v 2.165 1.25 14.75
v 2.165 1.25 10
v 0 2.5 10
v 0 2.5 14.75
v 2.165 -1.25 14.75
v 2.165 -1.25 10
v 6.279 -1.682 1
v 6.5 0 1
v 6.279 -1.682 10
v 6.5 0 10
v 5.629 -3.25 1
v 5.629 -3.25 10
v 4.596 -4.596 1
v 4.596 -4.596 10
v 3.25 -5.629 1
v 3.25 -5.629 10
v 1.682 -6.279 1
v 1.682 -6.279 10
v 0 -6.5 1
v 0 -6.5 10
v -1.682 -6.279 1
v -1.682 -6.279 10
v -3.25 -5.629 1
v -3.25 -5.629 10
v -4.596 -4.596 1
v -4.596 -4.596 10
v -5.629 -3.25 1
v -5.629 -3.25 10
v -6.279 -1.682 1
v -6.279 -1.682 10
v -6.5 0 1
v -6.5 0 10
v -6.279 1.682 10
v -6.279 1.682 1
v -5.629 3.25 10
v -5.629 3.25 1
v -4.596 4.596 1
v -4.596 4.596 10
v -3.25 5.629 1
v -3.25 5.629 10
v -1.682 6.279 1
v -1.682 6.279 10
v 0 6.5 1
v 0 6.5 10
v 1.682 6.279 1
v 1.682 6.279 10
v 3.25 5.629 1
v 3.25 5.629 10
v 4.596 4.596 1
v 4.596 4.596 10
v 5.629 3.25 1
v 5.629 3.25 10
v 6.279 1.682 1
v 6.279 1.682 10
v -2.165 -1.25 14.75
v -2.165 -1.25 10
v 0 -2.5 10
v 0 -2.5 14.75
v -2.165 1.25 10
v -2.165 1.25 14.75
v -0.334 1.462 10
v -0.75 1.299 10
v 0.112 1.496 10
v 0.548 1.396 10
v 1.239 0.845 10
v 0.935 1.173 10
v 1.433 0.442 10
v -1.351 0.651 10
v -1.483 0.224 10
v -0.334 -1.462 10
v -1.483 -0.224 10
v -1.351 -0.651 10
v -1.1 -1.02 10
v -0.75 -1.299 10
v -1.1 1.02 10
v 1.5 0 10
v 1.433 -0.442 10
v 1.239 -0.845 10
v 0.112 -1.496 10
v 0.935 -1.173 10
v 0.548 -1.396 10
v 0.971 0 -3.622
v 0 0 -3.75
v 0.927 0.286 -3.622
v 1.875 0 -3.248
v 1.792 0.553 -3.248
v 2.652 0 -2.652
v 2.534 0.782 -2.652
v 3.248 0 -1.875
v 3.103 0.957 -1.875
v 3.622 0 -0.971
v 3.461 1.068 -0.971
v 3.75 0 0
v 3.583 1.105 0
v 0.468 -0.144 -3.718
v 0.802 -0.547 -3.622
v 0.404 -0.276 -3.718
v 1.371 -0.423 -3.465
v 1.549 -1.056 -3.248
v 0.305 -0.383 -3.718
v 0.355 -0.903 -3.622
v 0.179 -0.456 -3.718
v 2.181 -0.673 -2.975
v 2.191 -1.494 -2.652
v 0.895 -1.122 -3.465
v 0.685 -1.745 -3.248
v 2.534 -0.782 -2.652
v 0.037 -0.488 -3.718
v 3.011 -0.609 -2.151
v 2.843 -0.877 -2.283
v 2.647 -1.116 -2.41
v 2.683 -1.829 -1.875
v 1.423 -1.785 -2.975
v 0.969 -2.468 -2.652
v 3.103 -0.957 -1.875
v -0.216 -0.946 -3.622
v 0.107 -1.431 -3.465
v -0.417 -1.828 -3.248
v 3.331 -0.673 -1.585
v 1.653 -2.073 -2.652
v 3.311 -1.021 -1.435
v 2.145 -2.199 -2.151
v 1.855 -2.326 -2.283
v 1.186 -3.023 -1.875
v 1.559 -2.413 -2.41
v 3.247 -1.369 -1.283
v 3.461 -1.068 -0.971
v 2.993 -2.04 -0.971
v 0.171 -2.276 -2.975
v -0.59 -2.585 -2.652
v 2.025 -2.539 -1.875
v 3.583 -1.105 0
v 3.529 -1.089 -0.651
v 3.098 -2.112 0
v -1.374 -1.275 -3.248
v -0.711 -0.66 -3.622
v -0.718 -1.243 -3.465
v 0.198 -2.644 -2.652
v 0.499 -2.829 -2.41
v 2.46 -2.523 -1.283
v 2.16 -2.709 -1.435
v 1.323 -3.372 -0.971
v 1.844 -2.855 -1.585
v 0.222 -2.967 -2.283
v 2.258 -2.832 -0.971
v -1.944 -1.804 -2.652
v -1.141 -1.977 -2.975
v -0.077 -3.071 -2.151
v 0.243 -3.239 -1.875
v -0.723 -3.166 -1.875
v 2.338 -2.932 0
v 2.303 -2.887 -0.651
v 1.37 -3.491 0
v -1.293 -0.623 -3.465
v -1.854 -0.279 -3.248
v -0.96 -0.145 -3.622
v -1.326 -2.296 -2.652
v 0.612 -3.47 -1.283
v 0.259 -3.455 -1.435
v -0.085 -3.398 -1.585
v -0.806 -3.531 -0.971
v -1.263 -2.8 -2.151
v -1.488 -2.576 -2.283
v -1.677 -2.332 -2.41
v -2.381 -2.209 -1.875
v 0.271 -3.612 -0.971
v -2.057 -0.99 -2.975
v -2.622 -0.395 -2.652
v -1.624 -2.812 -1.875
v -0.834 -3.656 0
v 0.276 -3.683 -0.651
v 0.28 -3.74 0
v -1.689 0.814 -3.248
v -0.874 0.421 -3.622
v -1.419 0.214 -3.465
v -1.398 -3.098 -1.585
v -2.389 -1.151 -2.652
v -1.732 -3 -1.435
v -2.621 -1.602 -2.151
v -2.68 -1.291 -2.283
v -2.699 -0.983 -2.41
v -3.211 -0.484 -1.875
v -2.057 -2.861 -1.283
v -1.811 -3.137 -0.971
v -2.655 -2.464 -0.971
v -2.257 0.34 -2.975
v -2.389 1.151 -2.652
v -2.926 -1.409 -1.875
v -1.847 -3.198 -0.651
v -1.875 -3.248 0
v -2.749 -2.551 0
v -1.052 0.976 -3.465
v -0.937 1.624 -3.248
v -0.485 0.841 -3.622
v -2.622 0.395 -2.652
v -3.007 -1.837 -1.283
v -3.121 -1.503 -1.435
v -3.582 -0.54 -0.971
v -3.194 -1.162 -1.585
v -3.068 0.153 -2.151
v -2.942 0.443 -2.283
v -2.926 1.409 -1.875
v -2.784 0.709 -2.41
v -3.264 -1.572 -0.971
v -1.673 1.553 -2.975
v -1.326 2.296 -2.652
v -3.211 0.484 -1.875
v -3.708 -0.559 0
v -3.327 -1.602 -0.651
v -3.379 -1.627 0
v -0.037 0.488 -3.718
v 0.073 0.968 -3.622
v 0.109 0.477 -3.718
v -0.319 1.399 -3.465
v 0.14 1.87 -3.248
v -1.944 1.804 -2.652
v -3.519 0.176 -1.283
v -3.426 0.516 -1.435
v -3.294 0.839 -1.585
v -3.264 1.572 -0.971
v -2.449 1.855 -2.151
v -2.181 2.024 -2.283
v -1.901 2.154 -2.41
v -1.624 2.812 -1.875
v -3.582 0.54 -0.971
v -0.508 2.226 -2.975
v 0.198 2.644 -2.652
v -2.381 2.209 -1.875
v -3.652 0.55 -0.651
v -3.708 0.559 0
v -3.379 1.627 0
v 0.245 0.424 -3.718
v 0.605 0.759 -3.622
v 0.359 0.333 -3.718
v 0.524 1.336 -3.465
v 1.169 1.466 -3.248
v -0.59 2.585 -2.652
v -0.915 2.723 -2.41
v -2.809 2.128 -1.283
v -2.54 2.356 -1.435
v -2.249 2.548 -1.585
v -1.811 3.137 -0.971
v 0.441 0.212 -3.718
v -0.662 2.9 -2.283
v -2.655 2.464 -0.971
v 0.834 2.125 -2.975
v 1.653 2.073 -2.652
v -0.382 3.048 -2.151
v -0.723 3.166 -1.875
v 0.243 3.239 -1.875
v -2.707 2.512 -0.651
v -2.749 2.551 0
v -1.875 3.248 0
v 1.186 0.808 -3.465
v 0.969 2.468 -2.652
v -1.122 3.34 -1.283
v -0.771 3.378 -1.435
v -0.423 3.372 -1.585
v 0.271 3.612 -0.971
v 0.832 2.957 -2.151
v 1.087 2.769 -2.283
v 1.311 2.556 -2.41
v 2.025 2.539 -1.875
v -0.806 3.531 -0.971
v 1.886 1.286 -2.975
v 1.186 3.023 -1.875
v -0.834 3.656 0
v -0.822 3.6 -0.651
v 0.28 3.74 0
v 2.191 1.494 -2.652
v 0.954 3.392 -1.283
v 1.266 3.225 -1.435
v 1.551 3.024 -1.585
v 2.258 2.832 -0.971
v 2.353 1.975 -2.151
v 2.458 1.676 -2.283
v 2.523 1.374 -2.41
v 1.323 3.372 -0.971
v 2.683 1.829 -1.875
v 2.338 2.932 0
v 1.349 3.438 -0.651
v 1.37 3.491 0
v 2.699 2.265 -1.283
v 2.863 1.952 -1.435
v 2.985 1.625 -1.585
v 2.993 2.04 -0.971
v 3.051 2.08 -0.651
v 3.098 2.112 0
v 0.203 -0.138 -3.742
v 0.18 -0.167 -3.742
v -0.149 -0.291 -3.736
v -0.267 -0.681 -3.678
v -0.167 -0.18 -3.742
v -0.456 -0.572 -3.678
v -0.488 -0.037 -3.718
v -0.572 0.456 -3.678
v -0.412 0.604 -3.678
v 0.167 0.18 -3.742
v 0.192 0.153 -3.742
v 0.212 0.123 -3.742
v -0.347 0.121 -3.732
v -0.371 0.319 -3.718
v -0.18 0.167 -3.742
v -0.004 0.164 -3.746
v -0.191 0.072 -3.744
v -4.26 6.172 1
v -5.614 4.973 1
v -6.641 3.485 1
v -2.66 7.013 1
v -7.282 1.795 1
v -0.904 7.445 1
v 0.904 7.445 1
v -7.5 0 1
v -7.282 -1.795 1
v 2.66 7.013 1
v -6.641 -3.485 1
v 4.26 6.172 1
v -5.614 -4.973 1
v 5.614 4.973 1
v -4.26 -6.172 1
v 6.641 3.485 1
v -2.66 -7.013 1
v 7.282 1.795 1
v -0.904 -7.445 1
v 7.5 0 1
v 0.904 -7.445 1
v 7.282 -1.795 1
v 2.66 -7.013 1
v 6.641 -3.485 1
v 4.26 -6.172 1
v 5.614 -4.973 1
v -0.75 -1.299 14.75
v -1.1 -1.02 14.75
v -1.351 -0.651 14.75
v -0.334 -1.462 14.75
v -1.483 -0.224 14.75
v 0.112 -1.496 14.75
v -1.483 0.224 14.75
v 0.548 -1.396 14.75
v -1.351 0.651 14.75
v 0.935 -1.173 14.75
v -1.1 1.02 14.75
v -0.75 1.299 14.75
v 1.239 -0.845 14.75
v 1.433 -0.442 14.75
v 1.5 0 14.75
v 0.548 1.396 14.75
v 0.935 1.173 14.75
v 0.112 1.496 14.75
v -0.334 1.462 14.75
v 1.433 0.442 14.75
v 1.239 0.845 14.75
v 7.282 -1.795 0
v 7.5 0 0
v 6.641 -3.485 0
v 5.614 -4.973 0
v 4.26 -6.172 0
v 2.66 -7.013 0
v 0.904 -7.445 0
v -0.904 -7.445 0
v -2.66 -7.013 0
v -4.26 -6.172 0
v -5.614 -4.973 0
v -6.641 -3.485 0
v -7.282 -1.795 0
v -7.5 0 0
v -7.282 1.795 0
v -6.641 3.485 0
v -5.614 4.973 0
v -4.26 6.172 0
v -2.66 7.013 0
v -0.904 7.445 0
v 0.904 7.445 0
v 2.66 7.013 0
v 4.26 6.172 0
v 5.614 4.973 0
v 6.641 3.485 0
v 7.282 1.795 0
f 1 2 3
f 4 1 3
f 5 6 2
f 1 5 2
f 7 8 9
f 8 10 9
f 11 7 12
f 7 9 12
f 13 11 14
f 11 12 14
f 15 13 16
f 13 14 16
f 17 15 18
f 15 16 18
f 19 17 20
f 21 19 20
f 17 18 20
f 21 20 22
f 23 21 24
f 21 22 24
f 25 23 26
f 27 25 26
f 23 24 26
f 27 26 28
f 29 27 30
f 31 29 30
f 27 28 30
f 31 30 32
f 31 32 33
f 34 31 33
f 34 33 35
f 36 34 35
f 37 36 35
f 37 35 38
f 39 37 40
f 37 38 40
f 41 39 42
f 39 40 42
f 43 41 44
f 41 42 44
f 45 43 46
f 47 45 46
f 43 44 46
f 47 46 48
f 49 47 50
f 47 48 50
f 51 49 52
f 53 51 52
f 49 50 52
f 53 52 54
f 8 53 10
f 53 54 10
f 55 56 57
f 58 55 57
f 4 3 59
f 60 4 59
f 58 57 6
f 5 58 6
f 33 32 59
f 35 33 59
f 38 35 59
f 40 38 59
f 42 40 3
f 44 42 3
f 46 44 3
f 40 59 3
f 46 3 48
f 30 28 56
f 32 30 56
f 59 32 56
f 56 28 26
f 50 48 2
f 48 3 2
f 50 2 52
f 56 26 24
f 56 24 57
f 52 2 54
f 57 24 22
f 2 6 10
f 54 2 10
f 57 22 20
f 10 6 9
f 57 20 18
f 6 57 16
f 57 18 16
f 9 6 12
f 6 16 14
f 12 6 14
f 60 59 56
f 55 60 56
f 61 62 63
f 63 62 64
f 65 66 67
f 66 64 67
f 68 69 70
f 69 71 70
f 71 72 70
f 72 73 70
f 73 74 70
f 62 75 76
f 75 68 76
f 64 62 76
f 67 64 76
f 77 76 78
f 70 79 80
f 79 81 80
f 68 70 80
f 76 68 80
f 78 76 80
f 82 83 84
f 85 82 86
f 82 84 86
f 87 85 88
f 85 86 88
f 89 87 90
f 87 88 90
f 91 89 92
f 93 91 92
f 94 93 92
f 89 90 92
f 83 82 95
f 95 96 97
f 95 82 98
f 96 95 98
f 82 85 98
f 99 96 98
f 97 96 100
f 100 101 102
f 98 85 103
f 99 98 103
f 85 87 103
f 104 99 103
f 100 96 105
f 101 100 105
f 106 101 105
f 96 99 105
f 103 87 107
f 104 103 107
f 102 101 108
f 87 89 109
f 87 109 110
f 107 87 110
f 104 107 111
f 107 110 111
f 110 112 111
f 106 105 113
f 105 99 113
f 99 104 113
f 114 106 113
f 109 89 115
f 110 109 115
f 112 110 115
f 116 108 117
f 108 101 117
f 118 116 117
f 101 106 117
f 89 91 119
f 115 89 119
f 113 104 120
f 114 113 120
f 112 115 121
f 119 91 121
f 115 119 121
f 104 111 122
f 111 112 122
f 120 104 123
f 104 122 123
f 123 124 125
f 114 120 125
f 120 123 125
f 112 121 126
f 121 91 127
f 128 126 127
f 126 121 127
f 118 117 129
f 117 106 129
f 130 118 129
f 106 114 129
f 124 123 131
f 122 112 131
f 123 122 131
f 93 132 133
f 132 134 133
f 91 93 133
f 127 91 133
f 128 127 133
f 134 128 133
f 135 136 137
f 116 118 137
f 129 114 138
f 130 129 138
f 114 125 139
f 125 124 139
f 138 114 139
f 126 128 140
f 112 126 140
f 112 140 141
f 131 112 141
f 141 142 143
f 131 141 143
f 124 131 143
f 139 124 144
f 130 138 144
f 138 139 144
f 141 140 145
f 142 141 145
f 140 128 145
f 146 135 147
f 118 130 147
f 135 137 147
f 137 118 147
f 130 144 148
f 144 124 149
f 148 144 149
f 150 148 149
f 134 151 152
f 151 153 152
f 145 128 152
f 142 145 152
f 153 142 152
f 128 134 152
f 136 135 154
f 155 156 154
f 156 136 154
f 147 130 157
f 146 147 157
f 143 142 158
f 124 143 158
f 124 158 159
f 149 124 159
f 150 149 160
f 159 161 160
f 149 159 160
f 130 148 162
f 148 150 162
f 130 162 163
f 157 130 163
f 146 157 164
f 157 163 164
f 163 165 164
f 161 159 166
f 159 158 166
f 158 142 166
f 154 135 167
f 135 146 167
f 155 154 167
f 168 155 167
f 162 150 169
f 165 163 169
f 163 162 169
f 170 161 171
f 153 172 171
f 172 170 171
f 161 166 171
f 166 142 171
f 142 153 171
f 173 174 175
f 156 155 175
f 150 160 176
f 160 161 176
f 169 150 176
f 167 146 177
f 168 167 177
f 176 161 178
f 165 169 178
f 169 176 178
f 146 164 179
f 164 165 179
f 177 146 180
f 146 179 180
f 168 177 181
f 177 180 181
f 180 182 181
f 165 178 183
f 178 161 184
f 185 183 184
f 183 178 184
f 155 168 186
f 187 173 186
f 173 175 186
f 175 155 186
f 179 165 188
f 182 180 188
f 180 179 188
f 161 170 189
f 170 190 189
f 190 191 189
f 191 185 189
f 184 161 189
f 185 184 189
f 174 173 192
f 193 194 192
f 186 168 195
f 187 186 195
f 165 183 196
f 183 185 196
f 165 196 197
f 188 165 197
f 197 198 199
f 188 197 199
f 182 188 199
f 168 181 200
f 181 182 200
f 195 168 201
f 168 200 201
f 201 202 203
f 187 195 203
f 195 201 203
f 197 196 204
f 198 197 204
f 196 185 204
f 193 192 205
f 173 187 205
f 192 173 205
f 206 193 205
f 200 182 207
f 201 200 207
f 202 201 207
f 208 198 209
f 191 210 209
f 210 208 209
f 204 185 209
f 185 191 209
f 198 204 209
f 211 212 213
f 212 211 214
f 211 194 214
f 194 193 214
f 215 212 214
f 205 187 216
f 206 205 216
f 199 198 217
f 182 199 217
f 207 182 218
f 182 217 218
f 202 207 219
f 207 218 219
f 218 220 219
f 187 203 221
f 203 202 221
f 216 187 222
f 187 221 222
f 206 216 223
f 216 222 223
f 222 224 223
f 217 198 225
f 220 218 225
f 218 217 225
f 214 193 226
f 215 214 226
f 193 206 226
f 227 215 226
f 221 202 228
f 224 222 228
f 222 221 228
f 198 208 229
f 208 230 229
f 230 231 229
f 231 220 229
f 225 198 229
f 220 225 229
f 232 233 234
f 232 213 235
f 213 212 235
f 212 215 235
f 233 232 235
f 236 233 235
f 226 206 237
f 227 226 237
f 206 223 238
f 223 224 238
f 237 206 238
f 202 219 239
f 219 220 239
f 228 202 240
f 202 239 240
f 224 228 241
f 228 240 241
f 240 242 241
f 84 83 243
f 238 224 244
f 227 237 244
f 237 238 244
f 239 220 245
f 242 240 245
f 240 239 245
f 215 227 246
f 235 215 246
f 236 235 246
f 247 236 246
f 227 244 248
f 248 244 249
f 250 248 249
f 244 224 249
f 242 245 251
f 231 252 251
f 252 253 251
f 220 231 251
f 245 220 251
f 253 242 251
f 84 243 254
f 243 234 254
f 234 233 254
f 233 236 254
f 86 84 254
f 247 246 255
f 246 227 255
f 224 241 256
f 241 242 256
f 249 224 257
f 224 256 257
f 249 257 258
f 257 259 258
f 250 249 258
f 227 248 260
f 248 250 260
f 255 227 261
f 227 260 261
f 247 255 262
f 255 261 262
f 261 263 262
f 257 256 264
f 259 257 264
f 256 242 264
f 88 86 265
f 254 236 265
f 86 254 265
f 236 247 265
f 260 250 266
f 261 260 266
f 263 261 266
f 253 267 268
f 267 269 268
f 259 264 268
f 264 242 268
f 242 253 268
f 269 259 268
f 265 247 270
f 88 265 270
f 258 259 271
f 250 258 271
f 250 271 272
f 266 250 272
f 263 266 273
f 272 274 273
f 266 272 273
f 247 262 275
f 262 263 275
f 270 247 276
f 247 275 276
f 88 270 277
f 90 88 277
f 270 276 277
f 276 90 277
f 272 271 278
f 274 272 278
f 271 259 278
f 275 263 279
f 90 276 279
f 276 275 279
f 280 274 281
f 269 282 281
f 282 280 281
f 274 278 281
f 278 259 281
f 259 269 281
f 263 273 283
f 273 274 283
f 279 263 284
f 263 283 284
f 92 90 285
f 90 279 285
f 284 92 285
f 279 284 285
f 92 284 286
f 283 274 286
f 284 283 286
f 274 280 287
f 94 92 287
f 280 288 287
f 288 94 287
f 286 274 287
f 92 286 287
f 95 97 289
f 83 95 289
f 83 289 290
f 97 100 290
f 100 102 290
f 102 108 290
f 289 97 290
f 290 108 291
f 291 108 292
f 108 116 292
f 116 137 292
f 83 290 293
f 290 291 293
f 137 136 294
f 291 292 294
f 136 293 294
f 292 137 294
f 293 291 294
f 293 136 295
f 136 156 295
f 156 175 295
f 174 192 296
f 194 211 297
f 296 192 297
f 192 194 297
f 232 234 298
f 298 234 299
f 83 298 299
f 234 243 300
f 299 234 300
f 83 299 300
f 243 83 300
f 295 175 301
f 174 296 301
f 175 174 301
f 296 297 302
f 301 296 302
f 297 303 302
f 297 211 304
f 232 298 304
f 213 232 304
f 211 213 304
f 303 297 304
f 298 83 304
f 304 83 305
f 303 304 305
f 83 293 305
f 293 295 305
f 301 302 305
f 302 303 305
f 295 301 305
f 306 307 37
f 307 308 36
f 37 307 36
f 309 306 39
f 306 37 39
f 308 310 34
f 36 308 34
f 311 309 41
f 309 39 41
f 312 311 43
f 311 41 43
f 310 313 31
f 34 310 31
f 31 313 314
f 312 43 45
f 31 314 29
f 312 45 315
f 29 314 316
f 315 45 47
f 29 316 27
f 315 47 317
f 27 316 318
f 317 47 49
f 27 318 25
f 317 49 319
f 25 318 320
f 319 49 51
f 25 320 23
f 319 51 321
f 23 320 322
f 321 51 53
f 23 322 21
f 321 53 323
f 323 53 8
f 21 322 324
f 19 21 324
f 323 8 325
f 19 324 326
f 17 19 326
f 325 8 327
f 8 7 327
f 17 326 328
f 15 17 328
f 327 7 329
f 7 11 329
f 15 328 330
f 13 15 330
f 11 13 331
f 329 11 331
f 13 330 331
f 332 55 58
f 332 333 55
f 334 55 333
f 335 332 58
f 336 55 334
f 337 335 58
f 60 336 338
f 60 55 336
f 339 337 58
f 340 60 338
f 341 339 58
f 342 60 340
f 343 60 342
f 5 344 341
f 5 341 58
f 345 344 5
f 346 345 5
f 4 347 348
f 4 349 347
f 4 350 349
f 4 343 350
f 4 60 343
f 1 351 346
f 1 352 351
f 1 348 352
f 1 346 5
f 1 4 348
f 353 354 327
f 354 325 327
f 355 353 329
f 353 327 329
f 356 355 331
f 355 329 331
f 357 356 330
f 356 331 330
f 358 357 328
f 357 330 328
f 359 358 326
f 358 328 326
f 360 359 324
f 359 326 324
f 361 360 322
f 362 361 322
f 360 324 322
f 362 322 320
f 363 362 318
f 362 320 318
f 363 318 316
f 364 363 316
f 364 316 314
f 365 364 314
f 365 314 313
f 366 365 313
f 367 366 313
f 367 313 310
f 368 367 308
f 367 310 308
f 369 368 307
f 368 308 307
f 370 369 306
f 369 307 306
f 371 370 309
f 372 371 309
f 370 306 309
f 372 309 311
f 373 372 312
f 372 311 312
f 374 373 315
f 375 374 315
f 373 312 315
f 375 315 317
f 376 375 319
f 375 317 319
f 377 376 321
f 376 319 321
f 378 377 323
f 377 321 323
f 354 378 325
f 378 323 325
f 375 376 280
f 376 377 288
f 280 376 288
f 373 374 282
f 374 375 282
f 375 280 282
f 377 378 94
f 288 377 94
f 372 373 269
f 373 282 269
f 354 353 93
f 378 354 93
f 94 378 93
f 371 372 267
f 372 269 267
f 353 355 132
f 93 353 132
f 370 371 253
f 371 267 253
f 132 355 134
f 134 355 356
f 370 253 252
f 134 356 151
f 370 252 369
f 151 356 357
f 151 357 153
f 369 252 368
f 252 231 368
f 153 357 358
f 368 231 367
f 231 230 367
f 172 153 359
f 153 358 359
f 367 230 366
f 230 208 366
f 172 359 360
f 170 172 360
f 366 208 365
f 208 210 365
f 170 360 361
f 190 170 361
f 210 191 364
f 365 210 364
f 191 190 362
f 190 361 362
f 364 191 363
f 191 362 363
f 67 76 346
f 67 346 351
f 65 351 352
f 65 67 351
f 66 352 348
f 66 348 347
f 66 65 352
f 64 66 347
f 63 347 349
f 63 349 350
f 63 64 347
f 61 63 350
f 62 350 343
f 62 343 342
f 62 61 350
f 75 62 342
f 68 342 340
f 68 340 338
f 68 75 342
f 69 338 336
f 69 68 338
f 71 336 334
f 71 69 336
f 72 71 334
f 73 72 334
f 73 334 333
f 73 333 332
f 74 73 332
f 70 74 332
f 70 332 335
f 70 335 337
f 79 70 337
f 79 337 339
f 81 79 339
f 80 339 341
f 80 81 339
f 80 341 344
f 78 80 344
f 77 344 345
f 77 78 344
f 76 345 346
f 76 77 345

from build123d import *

# Parameters (mm, degrees)
F2_R     = 1.5
F3_DEPTH = 4.75


with BuildPart() as f1:
    # F0 (on Front) → F1 (revolve)
    with BuildSketch(Plane.XZ):
        with BuildLine():
            Line((0, 0), (0, -3.75))
            ThreePointArc((0, -3.75), (2.65165, -2.65165), (3.75, 0))
            Line((3.75, 0), (0, 0))
        make_face()
        with BuildLine():
            Line((0, 0), (3.75, 0))
            ThreePointArc((3.75, 0), (2.65165, 2.65165), (0, 3.75))
            Line((0, 3.75), (0, 0))
        make_face()
        with BuildLine():
            ThreePointArc((0, 3.75), (2.65165, 2.65165), (3.75, 0))
            Line((3.75, 0), (7.5, 0))
            Line((7.5, 0), (7.5, 1))
            Line((7.5, 1), (6.5, 1))
            Line((6.5, 1), (6.5, 10))
            Line((6.5, 10), (0, 10))
            Line((0, 10), (0, 3.75))
        make_face()
    revolve(axis=Axis((0, 0, 3.125), (0, 0, -1)))

    # F2 (on face) → F3 (join)
    with BuildSketch(Plane.XY.offset(10)):
        Polygon((2.165064, 1.25), (0, 2.5), (-2.165064, 1.25), (-2.165064, -1.25), (0, -2.5), (2.165064, -1.25), align=None)
        Circle(F2_R, mode=Mode.SUBTRACT)
    extrude(amount=F3_DEPTH)


solid = f1.part
